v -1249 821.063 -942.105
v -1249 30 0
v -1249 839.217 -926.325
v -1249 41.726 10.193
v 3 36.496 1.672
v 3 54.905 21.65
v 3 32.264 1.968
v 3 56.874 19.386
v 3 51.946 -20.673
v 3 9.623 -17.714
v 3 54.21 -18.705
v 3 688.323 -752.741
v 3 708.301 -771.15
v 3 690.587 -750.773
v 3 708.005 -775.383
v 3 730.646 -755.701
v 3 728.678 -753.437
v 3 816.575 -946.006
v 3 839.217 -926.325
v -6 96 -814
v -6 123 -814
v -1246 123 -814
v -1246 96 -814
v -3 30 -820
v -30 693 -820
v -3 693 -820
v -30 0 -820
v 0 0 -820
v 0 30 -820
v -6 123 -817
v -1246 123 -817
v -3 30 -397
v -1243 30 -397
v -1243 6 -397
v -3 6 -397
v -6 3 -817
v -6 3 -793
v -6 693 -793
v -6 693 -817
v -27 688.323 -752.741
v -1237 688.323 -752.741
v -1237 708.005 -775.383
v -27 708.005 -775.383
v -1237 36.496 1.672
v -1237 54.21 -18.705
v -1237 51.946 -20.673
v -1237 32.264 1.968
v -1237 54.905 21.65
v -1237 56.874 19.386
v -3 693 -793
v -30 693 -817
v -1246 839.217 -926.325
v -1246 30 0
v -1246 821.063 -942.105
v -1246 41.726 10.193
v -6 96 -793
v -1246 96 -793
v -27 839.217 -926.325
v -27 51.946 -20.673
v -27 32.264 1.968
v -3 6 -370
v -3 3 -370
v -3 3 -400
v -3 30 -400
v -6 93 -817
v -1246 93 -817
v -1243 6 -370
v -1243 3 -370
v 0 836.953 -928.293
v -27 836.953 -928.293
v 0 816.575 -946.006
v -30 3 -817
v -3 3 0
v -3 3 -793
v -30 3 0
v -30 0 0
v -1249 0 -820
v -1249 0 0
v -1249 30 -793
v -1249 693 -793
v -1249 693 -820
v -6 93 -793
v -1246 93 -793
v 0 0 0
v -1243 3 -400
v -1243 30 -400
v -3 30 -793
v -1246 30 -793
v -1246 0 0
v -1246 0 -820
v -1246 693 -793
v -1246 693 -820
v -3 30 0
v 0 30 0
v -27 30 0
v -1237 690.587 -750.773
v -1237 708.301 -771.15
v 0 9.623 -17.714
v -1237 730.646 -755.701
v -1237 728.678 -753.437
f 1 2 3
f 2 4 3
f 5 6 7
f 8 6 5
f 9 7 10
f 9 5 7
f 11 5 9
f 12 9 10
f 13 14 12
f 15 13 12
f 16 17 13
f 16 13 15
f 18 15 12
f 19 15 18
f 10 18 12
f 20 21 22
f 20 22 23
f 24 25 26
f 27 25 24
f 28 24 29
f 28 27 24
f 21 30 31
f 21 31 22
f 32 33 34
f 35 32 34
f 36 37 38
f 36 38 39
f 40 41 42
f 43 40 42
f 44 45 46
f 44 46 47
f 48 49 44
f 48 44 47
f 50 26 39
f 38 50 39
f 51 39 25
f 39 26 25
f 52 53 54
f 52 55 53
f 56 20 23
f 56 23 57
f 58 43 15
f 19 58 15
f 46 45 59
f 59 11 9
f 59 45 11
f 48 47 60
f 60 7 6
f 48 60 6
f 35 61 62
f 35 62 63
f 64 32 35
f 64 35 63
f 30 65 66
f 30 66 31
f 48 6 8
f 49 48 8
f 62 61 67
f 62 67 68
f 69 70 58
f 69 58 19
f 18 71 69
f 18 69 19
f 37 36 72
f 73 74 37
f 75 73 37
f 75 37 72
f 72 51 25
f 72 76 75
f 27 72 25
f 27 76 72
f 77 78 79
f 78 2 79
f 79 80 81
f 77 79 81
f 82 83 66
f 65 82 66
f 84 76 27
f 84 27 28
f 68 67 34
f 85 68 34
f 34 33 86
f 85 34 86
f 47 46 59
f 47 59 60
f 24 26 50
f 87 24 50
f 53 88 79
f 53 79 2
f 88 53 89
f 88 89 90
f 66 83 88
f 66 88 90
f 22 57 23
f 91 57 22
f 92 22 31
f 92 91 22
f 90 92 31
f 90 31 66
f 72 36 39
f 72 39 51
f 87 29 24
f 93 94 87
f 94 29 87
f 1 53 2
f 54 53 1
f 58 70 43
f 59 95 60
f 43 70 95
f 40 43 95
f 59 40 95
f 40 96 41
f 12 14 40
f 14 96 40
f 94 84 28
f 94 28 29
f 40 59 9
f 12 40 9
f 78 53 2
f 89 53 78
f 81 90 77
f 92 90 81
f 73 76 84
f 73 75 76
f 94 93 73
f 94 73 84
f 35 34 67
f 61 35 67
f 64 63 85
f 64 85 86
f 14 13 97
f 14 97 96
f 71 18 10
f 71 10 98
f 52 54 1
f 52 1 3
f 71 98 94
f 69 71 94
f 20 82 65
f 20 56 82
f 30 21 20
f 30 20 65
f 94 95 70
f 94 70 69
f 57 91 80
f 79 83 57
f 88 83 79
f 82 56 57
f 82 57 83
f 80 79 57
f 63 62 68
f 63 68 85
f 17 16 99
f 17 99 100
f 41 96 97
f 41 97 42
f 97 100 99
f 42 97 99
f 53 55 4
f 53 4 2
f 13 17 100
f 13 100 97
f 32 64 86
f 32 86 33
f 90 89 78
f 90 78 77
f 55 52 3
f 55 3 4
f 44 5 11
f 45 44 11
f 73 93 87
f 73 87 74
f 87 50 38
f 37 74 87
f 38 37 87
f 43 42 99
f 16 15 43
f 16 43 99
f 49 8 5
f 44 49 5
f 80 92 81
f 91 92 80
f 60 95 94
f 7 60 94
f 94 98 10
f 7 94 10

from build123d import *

# Parameters (mm, degrees)
EXTRUDE_1_DEPTH  = 820
EXTRUDE_2_DEPTH  = 690
EXTRUDE_6_DEPTH  = 1230
EXTRUDE_7_DEPTH  = 1240
EXTRUDE_9_DEPTH  = 1240
EXTRUDE_11_DEPTH = 1240
EXTRUDE_12_DEPTH = 1240
EXTRUDE_13_DEPTH = 3
EXTRUDE_14_DEPTH = 3


with BuildPart() as part:
    # 草圖1 → 填料-伸長1 (new body)
    with BuildSketch(Plane.XY):
        Polygon((-30, 0), (0, 0), (0, 30), (-3, 30), (-3, 3), (-30, 3), align=None)
    extrude(amount=-EXTRUDE_1_DEPTH)

    # 草圖2 → 填料-伸長2 (add)
    with BuildSketch(Plane(origin=(0, 3, 0), x_dir=(1, 0, 0), z_dir=(0, 1, 0))):
        Polygon((-30, 820), (-3, 820), (-3, 793), (-6, 793), (-6, 817), (-30, 817), align=None)
    extrude(amount=EXTRUDE_2_DEPTH)


with BuildPart() as body_2:
    # 草圖5 → 填料-伸長6 (new body)
    with BuildSketch(Plane(origin=(0, 12.912403486, -14.854021031), x_dir=(-1, 0, 0), z_dir=(0, -0.6560590289905112, 0.7547095802227686))):
        Polygon((3, -22.641287407), (27, -22.641287407), (27, -25.641287407), (-3, -25.641287407), (-3, 4.358712593), (0, 4.358712593), (0, -22.641287407), align=None)
    extrude(amount=-EXTRUDE_6_DEPTH)

    # 草圖7 → 填料-伸長7 (add)
    with BuildSketch(Plane(origin=(3, 0, 0), x_dir=(0, 0, -1), z_dir=(1, 0, 0))):
        Polygon((-1.968177087, 32.264128741), (-21.649947957, 54.905416147), (-19.385819216, 56.873593234), (-1.672225433, 36.496434568), (18.704933233, 54.210028351), (20.67311032, 51.94589961), align=None)
    extrude(amount=-EXTRUDE_7_DEPTH)

    # 草圖10 → 填料-伸長12 (add)
    with BuildSketch(Plane(origin=(3, 0, 0), x_dir=(0, 0, -1), z_dir=(1, 0, 0))):
        Polygon((752.741403136, 688.323157731), (775.382690542, 708.004928601), (755.700919673, 730.646216008), (753.436790932, 728.678038921), (771.150384715, 708.300880255), (750.773226049, 690.587286472), align=None)
    extrude(amount=-EXTRUDE_12_DEPTH)


with BuildPart() as body_3:
    # 草圖8 → 填料-伸長9 (new body)
    with BuildSketch(Plane.ZY.offset(3)):
        Polygon((-400, 3), (-400, 30), (-397, 30), (-397, 6), (-370, 6), (-370, 3), align=None)
    extrude(amount=EXTRUDE_9_DEPTH)


with BuildPart() as body_4:
    # 草圖9 → 填料-伸長11 (new body)
    with BuildSketch(Plane.ZY.offset(6)):
        Polygon((-793, 93), (-817, 93), (-817, 123), (-814, 123), (-814, 96), (-793, 96), align=None)
    extrude(amount=EXTRUDE_11_DEPTH)

    # 草圖12 → 填料-伸長13 (add)
    with BuildSketch(Plane.ZY.offset(1246)):
        Polygon((0, 0), (-820, 0), (-820, 693), (-793, 693), (-793, 30), (0, 30), align=None)
    extrude(amount=EXTRUDE_13_DEPTH)


with BuildPart() as body_5:
    # 草圖13 → 填料-伸長14 (new body)
    with BuildSketch(Plane(origin=(-1246, 0, 0), x_dir=(0, 0, -1), z_dir=(1, 0, 0))):
        Polygon((0, 30), (942.105076275, 821.063380618), (926.324606587, 839.216734399), (-10.193106927, 41.72582818), align=None)
    extrude(amount=-EXTRUDE_14_DEPTH)


solid = Compound([part.part, body_2.part, body_3.part, body_4.part, body_5.part])
